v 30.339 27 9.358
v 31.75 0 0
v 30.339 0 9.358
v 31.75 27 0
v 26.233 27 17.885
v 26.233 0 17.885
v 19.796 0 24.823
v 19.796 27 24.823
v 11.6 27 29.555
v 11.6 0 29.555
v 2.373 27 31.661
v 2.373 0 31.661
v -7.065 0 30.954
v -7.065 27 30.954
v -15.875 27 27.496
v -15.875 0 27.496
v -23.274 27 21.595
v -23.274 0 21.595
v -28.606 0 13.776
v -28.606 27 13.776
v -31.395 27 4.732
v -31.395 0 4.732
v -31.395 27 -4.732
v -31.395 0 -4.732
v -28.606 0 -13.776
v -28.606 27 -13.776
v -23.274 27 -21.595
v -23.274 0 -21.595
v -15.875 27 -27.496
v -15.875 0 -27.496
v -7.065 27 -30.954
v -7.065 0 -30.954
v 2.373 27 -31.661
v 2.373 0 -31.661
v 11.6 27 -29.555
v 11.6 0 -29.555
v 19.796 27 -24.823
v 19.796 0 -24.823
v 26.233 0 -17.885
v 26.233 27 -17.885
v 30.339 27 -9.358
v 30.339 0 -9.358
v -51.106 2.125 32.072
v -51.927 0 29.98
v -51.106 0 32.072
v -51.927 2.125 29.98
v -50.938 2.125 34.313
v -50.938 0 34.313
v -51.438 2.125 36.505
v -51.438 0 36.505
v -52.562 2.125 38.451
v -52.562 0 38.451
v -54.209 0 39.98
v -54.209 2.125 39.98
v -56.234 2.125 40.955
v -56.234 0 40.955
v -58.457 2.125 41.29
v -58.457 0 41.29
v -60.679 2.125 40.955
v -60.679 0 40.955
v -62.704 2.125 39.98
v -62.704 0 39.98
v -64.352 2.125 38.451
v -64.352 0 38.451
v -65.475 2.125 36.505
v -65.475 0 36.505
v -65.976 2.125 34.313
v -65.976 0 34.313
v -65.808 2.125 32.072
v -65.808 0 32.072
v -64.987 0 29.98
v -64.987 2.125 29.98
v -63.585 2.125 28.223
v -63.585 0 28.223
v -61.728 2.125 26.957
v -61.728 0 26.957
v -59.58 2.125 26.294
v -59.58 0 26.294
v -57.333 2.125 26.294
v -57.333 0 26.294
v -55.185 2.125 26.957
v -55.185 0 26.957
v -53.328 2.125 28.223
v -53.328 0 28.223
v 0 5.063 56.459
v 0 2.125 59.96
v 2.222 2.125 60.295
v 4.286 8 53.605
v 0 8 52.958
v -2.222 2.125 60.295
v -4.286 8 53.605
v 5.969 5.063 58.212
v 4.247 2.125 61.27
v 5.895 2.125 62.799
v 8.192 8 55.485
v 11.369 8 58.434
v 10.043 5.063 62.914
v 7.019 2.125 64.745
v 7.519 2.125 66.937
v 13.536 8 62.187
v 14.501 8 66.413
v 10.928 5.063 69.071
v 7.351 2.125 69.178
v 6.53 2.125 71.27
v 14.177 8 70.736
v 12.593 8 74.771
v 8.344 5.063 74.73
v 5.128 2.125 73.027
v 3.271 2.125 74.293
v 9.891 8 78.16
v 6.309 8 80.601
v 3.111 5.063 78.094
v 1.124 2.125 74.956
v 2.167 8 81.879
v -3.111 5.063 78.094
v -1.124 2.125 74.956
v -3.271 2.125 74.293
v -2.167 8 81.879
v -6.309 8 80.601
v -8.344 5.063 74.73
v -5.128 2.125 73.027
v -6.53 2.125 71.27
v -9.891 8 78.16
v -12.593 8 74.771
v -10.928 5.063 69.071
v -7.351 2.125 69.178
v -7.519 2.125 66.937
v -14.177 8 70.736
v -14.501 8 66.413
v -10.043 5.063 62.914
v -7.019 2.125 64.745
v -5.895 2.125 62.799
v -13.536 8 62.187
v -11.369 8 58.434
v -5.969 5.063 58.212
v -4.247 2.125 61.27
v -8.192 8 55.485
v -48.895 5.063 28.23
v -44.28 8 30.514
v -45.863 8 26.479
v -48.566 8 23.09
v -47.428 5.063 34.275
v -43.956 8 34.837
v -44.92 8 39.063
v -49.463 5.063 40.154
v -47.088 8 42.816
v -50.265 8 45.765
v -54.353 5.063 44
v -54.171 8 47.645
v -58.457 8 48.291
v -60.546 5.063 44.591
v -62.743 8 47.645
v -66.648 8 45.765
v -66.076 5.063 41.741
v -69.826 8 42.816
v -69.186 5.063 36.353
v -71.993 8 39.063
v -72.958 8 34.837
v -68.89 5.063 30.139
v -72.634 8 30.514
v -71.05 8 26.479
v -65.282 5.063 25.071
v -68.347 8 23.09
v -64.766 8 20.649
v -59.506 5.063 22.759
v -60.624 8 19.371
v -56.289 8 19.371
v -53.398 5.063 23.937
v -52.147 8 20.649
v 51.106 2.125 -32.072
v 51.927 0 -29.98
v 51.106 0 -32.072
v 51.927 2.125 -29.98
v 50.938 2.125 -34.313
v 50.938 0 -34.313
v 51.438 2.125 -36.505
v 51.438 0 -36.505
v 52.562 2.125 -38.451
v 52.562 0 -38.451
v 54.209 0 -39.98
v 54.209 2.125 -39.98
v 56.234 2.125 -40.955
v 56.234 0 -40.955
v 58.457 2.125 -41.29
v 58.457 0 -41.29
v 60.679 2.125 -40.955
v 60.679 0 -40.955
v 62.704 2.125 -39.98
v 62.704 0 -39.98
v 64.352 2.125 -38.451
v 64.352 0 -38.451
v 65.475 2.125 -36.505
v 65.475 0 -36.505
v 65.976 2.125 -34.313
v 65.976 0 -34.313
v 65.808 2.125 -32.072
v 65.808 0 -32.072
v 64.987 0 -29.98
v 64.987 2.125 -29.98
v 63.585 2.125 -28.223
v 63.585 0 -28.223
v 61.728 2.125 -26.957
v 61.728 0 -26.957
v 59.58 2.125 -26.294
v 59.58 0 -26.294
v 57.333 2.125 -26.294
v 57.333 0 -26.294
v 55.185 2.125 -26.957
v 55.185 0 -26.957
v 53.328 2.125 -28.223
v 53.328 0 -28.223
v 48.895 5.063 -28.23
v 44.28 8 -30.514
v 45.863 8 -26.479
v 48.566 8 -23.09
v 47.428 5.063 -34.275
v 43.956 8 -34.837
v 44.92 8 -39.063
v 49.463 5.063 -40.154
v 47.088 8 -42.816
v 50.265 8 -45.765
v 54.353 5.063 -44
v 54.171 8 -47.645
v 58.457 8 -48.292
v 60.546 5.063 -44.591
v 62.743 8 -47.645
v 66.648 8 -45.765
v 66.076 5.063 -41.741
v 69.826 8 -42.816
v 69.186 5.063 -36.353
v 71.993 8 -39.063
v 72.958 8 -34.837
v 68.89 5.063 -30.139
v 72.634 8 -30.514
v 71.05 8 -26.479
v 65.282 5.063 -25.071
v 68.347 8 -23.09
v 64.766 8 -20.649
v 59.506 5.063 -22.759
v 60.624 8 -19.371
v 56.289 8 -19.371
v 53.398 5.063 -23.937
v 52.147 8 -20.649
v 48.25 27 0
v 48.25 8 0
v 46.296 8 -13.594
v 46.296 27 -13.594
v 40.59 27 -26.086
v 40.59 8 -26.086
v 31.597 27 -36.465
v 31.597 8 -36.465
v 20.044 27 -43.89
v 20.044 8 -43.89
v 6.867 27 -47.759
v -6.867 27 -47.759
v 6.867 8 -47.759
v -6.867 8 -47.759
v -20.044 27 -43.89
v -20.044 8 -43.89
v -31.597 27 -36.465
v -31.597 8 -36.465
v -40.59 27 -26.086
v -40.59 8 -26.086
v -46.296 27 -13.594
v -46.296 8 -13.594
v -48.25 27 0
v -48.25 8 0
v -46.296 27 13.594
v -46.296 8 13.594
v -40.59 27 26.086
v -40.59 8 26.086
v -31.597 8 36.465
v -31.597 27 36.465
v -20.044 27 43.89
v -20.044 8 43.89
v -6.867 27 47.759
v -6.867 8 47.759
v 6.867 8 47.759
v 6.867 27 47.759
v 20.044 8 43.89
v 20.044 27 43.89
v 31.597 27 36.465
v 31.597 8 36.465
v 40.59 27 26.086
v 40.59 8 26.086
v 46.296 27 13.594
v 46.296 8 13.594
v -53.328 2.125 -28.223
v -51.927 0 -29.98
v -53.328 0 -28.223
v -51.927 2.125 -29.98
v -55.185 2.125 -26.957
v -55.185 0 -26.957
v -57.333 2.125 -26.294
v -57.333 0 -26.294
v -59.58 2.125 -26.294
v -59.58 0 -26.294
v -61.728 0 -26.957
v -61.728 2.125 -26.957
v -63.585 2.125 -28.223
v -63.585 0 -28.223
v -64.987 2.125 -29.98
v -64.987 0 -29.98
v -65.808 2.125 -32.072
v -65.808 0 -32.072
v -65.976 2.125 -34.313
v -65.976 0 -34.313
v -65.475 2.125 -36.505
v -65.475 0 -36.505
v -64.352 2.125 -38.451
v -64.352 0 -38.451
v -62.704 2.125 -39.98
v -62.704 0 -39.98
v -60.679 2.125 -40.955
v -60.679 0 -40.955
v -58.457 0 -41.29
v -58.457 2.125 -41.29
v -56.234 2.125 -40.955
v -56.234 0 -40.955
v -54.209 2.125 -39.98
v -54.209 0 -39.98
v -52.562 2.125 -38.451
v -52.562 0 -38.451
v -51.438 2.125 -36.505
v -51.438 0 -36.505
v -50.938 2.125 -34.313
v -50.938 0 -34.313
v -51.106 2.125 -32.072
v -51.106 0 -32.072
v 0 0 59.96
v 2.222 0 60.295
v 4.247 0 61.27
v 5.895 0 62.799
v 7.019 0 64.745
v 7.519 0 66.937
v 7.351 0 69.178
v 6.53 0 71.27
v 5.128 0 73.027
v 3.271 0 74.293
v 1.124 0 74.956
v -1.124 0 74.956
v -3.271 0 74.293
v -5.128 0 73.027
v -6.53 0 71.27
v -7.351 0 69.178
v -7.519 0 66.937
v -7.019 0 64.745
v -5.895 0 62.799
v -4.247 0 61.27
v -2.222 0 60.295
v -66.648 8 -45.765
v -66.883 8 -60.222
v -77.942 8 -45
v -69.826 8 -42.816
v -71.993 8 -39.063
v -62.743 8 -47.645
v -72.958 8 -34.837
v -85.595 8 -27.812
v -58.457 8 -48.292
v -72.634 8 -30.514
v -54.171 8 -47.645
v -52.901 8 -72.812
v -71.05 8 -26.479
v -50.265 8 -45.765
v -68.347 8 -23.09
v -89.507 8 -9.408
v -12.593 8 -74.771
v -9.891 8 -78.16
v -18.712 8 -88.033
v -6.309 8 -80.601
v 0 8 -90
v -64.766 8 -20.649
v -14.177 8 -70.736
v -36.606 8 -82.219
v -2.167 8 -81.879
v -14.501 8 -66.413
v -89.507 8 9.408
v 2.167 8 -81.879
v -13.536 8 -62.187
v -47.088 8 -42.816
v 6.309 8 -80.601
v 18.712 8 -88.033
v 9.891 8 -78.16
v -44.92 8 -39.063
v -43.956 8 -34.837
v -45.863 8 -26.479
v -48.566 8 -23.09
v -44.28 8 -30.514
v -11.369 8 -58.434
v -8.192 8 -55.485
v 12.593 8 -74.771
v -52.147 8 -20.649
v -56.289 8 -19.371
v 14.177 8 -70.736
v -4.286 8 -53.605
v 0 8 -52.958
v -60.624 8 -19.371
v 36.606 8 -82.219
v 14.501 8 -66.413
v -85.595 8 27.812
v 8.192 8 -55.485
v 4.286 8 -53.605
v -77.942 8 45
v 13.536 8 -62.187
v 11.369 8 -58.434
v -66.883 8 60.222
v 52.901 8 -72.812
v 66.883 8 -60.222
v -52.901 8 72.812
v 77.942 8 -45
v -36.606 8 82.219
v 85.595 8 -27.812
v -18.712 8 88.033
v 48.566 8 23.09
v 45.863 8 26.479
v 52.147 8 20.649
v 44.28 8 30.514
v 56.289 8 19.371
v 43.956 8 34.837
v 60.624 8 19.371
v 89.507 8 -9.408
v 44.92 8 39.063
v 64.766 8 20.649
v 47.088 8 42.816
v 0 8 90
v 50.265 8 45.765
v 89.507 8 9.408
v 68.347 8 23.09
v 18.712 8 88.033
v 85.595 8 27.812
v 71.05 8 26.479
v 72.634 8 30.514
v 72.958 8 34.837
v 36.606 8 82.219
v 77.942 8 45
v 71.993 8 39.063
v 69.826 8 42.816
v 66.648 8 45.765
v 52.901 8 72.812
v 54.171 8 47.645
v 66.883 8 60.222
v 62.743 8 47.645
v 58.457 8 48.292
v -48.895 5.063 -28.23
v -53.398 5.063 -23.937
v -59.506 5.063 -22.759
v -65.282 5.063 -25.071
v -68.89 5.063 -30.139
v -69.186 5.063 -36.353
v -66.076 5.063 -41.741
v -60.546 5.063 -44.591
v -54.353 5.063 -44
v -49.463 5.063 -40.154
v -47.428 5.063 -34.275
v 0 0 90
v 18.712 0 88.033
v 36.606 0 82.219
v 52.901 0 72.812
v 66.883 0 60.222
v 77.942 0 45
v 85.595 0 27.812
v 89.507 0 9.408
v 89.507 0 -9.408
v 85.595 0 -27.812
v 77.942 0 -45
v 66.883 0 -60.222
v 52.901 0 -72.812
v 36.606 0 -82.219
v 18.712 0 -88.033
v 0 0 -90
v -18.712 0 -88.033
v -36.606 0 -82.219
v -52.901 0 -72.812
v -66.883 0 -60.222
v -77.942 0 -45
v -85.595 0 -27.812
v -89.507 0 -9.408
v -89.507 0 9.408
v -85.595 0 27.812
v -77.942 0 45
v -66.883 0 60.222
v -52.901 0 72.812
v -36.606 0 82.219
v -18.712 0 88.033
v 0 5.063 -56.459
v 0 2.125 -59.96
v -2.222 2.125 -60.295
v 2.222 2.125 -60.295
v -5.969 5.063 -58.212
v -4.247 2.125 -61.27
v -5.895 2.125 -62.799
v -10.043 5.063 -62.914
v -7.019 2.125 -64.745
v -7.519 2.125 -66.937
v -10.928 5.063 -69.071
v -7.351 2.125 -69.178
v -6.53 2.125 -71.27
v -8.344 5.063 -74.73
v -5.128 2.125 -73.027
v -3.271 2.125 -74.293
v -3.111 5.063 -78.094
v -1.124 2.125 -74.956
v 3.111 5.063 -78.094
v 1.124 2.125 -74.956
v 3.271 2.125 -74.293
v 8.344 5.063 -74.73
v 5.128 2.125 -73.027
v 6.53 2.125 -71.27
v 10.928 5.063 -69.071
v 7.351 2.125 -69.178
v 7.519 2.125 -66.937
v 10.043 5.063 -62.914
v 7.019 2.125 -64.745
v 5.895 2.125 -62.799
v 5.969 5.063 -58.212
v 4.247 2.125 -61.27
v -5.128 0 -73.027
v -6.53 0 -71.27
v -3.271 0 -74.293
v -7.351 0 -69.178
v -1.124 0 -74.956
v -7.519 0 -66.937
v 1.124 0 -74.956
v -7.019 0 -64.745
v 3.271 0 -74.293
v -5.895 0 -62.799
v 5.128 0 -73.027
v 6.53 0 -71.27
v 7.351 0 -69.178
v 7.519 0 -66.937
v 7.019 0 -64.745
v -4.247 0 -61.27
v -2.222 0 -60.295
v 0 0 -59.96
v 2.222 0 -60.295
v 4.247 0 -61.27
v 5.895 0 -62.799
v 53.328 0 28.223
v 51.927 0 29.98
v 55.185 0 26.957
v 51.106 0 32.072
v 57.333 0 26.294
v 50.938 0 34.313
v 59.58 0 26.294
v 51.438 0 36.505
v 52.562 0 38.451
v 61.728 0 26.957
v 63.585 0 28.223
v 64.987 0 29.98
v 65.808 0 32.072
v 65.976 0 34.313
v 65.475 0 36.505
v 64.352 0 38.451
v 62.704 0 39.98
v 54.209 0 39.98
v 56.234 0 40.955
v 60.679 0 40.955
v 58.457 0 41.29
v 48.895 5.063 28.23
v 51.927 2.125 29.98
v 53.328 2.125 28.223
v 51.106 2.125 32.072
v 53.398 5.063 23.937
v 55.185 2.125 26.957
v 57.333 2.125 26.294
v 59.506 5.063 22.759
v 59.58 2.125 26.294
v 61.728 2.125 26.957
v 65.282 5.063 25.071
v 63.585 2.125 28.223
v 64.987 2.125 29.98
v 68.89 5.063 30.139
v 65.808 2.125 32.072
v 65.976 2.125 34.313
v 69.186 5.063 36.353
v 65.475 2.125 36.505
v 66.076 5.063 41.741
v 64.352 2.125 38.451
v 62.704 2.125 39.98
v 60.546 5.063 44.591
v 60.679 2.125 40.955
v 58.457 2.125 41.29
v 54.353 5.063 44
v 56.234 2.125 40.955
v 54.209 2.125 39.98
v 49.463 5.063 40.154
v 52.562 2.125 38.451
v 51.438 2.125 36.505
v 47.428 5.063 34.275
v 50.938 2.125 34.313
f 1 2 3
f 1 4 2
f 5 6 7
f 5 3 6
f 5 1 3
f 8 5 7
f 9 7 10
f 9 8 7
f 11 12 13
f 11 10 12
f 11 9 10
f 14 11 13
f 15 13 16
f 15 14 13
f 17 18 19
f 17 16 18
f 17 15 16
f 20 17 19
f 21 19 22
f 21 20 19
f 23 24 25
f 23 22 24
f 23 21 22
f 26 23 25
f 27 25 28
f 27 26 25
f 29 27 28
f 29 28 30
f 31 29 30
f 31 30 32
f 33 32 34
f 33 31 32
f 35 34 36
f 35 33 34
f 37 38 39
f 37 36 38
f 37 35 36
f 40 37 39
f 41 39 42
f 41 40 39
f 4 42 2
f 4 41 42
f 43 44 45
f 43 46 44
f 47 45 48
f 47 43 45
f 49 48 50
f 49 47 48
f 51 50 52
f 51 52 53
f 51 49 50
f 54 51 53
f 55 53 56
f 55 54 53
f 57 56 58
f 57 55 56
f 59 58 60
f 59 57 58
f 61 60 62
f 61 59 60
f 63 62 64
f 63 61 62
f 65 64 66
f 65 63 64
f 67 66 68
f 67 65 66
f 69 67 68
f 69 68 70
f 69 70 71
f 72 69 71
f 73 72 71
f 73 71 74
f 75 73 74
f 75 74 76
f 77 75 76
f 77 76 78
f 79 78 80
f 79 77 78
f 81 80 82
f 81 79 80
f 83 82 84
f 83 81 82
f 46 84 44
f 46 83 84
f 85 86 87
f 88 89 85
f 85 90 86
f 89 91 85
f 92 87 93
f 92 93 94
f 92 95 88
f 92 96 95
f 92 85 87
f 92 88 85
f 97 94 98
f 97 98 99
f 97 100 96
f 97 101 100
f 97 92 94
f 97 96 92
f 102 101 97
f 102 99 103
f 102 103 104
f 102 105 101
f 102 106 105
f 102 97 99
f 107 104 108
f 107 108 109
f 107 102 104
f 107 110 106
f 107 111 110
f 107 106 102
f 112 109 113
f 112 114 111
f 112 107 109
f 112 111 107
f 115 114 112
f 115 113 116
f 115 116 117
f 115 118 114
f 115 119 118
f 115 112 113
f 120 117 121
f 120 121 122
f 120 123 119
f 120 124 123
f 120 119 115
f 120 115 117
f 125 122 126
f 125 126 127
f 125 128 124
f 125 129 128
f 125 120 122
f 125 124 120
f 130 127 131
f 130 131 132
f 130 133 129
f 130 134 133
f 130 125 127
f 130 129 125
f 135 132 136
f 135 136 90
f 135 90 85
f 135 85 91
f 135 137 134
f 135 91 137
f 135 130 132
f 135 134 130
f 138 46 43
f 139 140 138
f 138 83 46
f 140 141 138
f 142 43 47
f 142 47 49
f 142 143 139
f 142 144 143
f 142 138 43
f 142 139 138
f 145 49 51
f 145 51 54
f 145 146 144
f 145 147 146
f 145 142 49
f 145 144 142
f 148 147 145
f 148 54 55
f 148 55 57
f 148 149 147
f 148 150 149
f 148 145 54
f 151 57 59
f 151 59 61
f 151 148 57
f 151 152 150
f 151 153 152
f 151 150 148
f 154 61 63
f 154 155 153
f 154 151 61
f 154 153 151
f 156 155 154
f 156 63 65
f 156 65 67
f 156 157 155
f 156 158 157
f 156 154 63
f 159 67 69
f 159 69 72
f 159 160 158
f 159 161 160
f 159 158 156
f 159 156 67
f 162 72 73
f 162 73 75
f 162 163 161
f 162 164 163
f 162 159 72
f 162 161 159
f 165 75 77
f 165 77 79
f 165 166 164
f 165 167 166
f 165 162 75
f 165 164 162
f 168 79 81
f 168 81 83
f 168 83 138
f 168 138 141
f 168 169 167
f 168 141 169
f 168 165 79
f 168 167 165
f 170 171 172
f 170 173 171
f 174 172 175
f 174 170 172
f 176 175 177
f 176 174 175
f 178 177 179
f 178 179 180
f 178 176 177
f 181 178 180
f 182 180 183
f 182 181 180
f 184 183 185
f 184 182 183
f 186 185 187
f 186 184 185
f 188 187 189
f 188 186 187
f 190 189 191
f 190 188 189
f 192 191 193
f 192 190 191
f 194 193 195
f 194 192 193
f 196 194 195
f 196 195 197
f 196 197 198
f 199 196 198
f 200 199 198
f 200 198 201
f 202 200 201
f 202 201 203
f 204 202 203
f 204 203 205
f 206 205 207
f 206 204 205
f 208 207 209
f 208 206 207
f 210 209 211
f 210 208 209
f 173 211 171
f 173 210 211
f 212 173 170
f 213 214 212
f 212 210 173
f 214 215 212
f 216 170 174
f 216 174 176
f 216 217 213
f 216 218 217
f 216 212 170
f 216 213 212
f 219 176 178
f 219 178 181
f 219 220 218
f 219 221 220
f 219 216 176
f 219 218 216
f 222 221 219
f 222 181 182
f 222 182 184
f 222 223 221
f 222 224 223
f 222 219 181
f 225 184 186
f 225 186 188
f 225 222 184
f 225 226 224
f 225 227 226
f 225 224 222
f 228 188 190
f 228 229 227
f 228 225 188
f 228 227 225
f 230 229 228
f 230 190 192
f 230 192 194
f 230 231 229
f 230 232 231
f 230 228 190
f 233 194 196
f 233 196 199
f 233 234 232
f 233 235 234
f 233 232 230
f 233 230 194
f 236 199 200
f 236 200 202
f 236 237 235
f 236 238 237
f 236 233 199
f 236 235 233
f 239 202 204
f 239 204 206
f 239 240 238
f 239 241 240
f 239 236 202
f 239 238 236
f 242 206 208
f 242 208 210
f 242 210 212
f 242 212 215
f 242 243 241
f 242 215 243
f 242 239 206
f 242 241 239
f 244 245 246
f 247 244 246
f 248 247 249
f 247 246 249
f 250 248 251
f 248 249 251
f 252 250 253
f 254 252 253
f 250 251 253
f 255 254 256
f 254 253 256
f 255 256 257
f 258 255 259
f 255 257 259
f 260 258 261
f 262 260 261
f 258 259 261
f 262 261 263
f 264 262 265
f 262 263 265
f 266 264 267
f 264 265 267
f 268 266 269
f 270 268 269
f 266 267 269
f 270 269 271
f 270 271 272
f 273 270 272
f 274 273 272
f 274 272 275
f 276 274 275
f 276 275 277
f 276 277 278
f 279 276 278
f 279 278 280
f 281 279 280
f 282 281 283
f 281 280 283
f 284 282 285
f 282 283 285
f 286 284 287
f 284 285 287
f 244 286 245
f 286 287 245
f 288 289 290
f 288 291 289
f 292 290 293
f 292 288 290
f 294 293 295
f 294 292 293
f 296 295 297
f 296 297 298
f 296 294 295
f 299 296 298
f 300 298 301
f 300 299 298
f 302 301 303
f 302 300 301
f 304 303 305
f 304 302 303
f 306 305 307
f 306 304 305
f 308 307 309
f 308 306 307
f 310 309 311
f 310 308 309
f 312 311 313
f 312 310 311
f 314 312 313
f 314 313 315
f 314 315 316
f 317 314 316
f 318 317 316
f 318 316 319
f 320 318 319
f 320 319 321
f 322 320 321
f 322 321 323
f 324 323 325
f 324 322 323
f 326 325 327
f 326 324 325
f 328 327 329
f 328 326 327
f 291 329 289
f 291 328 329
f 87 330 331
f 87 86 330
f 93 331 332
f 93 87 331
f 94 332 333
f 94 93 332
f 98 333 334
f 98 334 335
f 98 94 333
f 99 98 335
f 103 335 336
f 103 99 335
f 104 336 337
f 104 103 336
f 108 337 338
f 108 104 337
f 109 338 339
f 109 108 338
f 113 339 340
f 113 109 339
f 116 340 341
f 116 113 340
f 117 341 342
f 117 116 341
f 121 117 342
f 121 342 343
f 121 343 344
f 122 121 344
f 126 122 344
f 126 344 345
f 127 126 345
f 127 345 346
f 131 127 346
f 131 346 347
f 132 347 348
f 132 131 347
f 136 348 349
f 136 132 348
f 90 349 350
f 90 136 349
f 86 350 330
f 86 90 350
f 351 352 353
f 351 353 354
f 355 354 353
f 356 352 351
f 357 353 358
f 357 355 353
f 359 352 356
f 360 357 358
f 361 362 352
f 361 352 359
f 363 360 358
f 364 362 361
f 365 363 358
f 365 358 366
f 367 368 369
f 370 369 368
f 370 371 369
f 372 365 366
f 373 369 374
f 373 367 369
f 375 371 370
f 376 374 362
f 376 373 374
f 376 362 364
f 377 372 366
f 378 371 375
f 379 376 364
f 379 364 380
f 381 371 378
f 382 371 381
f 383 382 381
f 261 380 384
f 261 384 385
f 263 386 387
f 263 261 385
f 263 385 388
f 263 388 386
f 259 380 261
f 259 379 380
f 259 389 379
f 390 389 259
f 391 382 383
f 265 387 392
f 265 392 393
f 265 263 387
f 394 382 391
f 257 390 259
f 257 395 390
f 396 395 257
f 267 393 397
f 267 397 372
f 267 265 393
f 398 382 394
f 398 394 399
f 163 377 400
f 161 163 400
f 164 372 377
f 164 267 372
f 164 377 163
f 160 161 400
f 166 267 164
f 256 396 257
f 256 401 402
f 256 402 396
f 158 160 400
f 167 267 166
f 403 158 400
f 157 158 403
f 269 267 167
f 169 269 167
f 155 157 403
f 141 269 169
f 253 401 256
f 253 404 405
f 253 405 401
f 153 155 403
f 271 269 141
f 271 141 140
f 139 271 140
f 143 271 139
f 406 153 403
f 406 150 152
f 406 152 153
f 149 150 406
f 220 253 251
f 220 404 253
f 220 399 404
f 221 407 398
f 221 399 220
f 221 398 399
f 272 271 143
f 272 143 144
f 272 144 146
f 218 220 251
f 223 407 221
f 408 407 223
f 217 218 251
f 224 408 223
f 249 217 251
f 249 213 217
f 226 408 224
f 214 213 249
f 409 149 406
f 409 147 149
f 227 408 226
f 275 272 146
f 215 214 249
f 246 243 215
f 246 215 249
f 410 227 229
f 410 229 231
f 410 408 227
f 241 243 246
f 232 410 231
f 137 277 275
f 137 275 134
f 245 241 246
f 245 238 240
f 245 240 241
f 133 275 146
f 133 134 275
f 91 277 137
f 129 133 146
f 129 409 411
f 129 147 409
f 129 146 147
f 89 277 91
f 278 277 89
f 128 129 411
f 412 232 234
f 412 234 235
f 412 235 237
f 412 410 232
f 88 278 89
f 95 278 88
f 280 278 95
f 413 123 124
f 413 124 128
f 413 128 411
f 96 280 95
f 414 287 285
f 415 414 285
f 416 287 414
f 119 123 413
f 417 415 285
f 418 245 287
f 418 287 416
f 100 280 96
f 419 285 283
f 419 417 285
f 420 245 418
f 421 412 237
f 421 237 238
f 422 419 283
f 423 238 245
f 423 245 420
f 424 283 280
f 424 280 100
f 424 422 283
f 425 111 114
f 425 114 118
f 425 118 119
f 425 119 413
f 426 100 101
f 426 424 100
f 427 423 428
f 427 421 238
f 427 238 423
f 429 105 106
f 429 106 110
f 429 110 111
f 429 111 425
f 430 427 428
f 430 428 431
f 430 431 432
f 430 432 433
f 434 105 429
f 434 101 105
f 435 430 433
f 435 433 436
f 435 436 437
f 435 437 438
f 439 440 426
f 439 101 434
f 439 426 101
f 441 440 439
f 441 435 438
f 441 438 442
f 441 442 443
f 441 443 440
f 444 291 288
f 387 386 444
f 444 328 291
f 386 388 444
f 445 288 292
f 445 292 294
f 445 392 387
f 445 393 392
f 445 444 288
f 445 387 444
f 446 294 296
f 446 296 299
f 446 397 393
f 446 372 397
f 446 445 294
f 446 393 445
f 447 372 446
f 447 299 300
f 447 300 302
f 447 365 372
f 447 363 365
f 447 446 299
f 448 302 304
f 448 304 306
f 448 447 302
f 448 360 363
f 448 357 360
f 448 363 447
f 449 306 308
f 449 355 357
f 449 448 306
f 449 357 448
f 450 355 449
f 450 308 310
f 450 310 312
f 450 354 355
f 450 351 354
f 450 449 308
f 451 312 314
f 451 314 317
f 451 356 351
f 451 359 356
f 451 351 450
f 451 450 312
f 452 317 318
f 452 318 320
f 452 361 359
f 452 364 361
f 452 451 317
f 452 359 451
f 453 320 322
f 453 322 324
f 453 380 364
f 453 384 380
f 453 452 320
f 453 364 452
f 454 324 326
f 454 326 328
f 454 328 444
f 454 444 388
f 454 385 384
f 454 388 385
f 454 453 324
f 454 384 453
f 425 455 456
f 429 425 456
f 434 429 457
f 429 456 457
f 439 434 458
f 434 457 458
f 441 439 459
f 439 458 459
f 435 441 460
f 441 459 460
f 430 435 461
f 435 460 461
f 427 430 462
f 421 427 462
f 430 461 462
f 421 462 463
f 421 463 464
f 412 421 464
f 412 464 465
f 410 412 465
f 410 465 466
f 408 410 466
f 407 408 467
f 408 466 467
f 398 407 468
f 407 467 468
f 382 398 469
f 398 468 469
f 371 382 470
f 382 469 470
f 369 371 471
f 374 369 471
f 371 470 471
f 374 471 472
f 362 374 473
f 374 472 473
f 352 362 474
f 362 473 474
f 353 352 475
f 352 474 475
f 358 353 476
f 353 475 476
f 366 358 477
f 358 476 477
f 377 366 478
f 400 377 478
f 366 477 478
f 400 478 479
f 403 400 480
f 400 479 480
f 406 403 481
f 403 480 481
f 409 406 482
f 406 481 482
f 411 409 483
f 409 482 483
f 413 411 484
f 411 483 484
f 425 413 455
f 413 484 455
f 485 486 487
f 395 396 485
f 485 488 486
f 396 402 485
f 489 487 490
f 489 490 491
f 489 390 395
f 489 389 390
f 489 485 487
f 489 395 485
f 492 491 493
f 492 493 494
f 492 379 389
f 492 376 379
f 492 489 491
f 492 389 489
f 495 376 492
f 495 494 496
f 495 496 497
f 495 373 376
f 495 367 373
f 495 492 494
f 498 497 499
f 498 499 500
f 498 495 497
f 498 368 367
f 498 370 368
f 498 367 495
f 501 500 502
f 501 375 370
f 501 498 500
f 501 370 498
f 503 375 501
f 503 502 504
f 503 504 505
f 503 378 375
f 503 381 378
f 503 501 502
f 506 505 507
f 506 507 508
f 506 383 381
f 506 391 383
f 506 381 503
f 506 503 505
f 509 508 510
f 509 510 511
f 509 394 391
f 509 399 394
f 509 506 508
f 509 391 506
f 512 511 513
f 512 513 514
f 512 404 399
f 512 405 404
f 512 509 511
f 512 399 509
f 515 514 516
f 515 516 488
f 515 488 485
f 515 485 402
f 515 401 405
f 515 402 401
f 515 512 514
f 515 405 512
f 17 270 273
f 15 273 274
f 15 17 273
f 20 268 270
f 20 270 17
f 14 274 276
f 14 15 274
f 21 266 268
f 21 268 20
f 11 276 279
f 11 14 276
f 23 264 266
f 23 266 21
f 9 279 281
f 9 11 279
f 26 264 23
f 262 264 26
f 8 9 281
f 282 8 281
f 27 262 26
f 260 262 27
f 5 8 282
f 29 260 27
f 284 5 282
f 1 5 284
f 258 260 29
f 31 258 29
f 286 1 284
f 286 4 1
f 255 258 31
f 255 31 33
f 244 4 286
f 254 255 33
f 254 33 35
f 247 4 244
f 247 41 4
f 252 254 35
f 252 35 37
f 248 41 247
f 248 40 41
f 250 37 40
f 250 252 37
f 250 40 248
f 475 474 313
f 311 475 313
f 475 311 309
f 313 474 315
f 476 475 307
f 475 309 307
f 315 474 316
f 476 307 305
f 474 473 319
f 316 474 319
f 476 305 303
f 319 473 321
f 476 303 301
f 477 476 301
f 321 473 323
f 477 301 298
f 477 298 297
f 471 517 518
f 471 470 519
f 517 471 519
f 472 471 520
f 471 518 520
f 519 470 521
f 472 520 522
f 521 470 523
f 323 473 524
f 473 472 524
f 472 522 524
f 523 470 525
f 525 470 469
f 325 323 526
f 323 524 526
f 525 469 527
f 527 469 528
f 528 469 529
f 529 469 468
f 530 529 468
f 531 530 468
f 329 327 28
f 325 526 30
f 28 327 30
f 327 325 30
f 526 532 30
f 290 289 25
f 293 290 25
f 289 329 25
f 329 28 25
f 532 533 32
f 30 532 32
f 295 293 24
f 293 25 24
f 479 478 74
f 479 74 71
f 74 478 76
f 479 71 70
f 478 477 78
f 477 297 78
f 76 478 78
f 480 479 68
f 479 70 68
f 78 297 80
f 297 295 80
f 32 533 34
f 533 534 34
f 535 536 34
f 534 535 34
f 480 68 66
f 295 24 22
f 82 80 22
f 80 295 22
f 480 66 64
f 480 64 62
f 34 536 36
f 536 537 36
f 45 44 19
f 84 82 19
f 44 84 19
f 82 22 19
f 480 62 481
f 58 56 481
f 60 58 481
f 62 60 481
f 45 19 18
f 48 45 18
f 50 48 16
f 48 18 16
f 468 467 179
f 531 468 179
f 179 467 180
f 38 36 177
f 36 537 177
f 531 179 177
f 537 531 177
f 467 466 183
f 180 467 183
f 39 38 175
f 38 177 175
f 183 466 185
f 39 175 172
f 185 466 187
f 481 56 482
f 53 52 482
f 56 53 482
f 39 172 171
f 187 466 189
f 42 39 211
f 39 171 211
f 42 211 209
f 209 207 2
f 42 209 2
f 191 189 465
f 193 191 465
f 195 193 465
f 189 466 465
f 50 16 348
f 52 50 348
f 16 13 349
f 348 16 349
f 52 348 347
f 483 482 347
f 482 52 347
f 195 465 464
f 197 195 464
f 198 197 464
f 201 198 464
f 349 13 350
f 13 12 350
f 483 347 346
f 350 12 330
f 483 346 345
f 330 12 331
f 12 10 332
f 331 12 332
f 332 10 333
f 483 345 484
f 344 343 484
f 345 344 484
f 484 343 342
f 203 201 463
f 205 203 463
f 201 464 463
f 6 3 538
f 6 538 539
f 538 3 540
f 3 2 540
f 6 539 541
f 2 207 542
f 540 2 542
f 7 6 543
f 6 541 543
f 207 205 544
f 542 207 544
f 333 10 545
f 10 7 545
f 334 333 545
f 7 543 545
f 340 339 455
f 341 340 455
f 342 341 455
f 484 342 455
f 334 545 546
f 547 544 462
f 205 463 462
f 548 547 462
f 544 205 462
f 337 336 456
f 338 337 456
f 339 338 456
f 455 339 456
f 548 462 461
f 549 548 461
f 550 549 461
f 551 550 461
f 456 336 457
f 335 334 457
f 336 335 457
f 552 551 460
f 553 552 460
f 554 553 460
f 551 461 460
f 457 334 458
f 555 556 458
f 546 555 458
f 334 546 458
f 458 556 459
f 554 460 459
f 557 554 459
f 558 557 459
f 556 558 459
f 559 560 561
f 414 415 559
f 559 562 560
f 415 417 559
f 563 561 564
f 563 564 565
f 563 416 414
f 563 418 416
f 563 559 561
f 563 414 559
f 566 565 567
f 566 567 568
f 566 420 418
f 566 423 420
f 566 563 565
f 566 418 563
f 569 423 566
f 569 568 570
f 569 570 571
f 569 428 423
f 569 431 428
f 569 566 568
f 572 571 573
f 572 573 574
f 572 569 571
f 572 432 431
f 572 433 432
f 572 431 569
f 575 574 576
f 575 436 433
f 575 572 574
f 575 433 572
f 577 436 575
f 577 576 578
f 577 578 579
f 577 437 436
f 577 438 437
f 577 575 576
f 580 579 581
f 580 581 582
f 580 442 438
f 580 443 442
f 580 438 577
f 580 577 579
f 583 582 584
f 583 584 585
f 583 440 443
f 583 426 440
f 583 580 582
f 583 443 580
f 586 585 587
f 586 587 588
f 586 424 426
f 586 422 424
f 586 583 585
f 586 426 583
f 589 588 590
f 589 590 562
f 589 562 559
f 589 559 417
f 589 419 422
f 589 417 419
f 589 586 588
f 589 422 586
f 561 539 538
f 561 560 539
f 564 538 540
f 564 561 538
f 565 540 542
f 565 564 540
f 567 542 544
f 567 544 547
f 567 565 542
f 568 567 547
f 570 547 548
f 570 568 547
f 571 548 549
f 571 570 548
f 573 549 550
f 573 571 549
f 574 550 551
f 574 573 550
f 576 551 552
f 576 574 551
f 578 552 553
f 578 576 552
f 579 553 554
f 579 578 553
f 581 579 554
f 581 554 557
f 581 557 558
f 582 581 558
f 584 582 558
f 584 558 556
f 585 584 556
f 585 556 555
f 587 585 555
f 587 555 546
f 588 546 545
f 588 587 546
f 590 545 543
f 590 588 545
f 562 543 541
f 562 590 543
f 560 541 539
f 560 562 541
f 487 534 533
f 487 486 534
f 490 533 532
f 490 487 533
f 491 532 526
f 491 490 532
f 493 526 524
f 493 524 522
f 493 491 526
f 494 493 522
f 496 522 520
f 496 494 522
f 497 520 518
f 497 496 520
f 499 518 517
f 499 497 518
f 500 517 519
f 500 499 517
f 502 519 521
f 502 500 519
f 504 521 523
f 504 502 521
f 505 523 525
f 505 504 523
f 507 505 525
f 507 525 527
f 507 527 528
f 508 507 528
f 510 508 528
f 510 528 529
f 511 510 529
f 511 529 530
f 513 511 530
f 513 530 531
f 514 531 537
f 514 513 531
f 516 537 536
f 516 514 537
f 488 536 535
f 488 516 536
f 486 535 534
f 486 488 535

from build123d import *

# Parameters (mm, degrees)
SKETCH5_R           = 90
BOSS_EXTRUDE1_DEPTH = 8
SKETCH6_R           = 48.25
SKETCH6_R_2         = 31.75
EXTRUDE_THIN1_DEPTH = 19
CIRPATTERN1_COUNT   = 6
SKETCH13_W          = 31.75
SKETCH13_H          = 30.969260742


with BuildPart() as part:
    # Sketch5 → Boss-Extrude1 (new body)
    with BuildSketch(Plane(origin=(0, 0, 0), x_dir=(1, 0, 0), z_dir=(0, 1, 0))):
        with Locations(Location((0, 0, 0), (0, 0, 270))):
            Circle(SKETCH5_R)
    extrude(amount=BOSS_EXTRUDE1_DEPTH)

    # Sketch6 → Extrude-Thin1 (add)
    with BuildSketch(Plane(origin=(0, 8, 0), x_dir=(1, 0, 0), z_dir=(0, 1, 0))):
        Circle(SKETCH6_R)
        Circle(SKETCH6_R_2, mode=Mode.SUBTRACT)
    extrude(amount=EXTRUDE_THIN1_DEPTH)

    # Sketch10 → CSK for 9/16 Flat Head Machine Screw (100)1 (revolve, cut)
    with BuildSketch(Plane(origin=(0, 8, -67.5), x_dir=(0, 0, 1), z_dir=(1, 0, 0))):
        Polygon((0, 0), (0, 8), (7.53999, 8), (7.53999, 5.874964459), (14.5415, 0), align=None)
    csk_for_9_16_flat_head_machine_screw_10 = revolve(axis=Axis((0, 14.35, -67.5), (0, -1, 0)), mode=Mode.SUBTRACT)

    # CirPattern1: CSK for 9/16 Flat Head Machine Screw (100)1 ×6 about axis
    cirpattern1_axis = Axis((0, 0, 0), (0, 1, 0))
    for i in range(1, CIRPATTERN1_COUNT):
        add(csk_for_9_16_flat_head_machine_screw_10.rotate(cirpattern1_axis, i * 360 / CIRPATTERN1_COUNT), mode=Mode.SUBTRACT)

    # Sketch13 → Cut-Revolve1 (revolve, cut)
    with BuildSketch(Plane.XY, mode=Mode.PRIVATE) as cut_revolve1_sk:
        with Locations((-15.875, 11.515369629)):
            Rectangle(SKETCH13_W, SKETCH13_H)
    revolve(cut_revolve1_sk.sketch.rotate(Axis((0, 27, 0), (0, -1, 0)), 180), axis=Axis((0, 27, 0), (0, -1, 0)), mode=Mode.SUBTRACT)


solid = part.part
